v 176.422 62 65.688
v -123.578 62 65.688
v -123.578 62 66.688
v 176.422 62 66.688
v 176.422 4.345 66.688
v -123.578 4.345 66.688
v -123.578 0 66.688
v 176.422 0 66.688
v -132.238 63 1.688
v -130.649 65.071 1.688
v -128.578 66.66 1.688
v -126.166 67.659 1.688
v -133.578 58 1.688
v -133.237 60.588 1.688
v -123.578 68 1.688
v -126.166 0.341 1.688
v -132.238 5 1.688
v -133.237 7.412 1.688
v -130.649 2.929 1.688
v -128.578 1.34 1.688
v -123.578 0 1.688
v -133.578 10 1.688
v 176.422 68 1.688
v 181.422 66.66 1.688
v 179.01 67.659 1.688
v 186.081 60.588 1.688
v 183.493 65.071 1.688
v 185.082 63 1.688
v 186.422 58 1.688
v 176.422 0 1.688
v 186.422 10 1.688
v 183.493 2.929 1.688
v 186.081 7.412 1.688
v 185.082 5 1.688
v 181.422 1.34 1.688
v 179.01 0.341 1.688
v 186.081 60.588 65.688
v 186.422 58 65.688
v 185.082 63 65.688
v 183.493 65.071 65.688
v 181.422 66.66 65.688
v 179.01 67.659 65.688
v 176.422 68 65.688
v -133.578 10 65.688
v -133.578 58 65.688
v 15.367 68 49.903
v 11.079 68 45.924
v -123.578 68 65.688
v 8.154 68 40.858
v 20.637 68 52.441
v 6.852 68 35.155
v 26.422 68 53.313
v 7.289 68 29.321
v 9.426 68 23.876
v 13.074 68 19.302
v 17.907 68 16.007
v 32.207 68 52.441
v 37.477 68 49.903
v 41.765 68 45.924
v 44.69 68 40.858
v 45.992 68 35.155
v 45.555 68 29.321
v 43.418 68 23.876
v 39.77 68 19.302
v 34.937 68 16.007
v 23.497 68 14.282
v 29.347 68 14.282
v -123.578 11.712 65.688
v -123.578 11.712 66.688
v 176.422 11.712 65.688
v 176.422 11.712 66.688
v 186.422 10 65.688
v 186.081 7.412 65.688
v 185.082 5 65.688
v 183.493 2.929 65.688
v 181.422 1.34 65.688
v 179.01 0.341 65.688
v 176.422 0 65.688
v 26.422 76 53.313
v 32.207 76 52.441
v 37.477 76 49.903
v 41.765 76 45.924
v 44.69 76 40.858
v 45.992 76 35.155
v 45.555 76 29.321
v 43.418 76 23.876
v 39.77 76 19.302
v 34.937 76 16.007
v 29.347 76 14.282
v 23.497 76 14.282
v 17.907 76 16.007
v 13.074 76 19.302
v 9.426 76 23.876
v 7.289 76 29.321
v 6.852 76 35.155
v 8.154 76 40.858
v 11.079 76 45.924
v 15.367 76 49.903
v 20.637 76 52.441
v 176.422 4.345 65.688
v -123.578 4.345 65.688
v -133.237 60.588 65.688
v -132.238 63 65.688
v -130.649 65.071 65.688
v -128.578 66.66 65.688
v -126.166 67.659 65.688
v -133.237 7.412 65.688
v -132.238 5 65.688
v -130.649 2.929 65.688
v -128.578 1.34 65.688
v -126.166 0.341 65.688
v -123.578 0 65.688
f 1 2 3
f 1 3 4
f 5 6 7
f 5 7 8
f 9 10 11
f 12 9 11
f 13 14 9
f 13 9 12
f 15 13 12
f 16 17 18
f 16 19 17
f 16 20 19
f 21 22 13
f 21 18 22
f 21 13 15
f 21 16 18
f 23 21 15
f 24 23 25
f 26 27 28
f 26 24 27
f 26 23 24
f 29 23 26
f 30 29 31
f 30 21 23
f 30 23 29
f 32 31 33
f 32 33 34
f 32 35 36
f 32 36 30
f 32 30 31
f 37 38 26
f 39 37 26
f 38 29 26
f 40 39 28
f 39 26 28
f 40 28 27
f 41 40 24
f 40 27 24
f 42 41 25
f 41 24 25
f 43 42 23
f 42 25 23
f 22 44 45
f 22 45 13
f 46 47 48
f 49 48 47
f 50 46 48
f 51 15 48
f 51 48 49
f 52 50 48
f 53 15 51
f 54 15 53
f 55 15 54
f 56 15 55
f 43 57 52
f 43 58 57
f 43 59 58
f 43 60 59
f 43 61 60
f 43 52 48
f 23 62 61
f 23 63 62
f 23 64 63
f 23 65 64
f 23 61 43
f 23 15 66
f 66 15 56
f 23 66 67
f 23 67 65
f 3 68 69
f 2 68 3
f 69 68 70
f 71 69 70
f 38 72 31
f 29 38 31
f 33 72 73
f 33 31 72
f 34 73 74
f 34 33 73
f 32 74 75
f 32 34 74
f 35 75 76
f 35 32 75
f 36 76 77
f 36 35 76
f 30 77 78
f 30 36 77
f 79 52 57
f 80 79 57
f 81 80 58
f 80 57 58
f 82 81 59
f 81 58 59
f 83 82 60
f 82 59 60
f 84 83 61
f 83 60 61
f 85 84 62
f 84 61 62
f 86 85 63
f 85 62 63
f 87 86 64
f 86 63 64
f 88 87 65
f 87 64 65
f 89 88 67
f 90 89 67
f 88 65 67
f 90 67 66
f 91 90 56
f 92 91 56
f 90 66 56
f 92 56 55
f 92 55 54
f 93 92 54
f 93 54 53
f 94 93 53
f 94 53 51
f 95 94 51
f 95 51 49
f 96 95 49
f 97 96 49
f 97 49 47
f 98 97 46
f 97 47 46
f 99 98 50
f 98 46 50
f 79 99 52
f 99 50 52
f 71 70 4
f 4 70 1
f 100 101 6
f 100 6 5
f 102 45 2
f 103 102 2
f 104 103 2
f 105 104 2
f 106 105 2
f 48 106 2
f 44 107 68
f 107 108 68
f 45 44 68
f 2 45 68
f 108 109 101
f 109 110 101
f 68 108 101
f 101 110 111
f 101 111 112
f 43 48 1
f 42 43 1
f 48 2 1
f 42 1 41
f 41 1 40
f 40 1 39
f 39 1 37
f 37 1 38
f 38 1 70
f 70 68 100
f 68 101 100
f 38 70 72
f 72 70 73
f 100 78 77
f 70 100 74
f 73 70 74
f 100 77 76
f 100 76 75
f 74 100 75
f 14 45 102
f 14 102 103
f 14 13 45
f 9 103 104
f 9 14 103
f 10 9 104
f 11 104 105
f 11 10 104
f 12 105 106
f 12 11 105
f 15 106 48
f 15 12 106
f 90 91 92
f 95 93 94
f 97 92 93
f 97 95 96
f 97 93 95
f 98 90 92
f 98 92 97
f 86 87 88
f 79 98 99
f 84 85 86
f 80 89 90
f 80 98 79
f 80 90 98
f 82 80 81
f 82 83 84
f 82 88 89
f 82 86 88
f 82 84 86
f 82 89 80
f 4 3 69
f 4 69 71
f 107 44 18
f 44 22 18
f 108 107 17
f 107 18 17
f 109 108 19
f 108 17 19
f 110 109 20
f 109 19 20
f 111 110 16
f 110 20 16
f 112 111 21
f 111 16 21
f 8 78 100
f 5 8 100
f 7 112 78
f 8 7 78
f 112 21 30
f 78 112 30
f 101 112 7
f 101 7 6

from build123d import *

# Parameters (mm, degrees)
SKETCH_1_W      = 320
SKETCH_1_H      = 64
EXTRUDE_1_DEPTH = 68
FILLET_1_R      = 10
SKETCH_2_R      = 19.624889804
EXTRUDE_2_DEPTH = 8
SKETCH_3_W      = 300
SKETCH_3_H      = 50.287952294
SKETCH_3_H_2    = 4.344723496
EXTRUDE_3_DEPTH = 1


with BuildPart() as part:
    # 草图1 → 凸台-拉伸1 (new body)
    with BuildSketch(Plane(origin=(0, 0, 0), x_dir=(1, 0, 0), z_dir=(0, 1, 0))):
        with Locations((26.422018349, -33.688073394)):
            Rectangle(SKETCH_1_W, SKETCH_1_H)
    extrude(amount=EXTRUDE_1_DEPTH)

    # 圆角1
    fillet_1_edges = [part.edges().sort_by_distance(p)[0] for p in [
        (186.422018349, 68, 33.688073394),
        (-133.577981651, 68, 33.688073394),
        (186.422018349, 0, 33.688073394),
        (-133.577981651, 0, 33.688073394),
    ]]
    fillet(fillet_1_edges, radius=FILLET_1_R)

    # 草图2 → 凸台-拉伸2 (add)
    with BuildSketch(Plane(origin=(0, 68, 0), x_dir=(1, 0, 0), z_dir=(0, 1, 0))):
        with Locations(Location((26.422018349, -33.688073394, 0), (0, 0, 270))):
            Circle(SKETCH_2_R)
    extrude(amount=EXTRUDE_2_DEPTH)

    # 草图3 → 凸台-拉伸3 (add)
    with BuildSketch(Plane.XY.offset(65.688073394)):
        with Locations((26.422018349, 36.856023853)):
            Rectangle(SKETCH_3_W, SKETCH_3_H)
        with Locations((26.422018349, 2.172361748)):
            Rectangle(SKETCH_3_W, SKETCH_3_H_2)
    extrude(amount=EXTRUDE_3_DEPTH)


solid = part.part
